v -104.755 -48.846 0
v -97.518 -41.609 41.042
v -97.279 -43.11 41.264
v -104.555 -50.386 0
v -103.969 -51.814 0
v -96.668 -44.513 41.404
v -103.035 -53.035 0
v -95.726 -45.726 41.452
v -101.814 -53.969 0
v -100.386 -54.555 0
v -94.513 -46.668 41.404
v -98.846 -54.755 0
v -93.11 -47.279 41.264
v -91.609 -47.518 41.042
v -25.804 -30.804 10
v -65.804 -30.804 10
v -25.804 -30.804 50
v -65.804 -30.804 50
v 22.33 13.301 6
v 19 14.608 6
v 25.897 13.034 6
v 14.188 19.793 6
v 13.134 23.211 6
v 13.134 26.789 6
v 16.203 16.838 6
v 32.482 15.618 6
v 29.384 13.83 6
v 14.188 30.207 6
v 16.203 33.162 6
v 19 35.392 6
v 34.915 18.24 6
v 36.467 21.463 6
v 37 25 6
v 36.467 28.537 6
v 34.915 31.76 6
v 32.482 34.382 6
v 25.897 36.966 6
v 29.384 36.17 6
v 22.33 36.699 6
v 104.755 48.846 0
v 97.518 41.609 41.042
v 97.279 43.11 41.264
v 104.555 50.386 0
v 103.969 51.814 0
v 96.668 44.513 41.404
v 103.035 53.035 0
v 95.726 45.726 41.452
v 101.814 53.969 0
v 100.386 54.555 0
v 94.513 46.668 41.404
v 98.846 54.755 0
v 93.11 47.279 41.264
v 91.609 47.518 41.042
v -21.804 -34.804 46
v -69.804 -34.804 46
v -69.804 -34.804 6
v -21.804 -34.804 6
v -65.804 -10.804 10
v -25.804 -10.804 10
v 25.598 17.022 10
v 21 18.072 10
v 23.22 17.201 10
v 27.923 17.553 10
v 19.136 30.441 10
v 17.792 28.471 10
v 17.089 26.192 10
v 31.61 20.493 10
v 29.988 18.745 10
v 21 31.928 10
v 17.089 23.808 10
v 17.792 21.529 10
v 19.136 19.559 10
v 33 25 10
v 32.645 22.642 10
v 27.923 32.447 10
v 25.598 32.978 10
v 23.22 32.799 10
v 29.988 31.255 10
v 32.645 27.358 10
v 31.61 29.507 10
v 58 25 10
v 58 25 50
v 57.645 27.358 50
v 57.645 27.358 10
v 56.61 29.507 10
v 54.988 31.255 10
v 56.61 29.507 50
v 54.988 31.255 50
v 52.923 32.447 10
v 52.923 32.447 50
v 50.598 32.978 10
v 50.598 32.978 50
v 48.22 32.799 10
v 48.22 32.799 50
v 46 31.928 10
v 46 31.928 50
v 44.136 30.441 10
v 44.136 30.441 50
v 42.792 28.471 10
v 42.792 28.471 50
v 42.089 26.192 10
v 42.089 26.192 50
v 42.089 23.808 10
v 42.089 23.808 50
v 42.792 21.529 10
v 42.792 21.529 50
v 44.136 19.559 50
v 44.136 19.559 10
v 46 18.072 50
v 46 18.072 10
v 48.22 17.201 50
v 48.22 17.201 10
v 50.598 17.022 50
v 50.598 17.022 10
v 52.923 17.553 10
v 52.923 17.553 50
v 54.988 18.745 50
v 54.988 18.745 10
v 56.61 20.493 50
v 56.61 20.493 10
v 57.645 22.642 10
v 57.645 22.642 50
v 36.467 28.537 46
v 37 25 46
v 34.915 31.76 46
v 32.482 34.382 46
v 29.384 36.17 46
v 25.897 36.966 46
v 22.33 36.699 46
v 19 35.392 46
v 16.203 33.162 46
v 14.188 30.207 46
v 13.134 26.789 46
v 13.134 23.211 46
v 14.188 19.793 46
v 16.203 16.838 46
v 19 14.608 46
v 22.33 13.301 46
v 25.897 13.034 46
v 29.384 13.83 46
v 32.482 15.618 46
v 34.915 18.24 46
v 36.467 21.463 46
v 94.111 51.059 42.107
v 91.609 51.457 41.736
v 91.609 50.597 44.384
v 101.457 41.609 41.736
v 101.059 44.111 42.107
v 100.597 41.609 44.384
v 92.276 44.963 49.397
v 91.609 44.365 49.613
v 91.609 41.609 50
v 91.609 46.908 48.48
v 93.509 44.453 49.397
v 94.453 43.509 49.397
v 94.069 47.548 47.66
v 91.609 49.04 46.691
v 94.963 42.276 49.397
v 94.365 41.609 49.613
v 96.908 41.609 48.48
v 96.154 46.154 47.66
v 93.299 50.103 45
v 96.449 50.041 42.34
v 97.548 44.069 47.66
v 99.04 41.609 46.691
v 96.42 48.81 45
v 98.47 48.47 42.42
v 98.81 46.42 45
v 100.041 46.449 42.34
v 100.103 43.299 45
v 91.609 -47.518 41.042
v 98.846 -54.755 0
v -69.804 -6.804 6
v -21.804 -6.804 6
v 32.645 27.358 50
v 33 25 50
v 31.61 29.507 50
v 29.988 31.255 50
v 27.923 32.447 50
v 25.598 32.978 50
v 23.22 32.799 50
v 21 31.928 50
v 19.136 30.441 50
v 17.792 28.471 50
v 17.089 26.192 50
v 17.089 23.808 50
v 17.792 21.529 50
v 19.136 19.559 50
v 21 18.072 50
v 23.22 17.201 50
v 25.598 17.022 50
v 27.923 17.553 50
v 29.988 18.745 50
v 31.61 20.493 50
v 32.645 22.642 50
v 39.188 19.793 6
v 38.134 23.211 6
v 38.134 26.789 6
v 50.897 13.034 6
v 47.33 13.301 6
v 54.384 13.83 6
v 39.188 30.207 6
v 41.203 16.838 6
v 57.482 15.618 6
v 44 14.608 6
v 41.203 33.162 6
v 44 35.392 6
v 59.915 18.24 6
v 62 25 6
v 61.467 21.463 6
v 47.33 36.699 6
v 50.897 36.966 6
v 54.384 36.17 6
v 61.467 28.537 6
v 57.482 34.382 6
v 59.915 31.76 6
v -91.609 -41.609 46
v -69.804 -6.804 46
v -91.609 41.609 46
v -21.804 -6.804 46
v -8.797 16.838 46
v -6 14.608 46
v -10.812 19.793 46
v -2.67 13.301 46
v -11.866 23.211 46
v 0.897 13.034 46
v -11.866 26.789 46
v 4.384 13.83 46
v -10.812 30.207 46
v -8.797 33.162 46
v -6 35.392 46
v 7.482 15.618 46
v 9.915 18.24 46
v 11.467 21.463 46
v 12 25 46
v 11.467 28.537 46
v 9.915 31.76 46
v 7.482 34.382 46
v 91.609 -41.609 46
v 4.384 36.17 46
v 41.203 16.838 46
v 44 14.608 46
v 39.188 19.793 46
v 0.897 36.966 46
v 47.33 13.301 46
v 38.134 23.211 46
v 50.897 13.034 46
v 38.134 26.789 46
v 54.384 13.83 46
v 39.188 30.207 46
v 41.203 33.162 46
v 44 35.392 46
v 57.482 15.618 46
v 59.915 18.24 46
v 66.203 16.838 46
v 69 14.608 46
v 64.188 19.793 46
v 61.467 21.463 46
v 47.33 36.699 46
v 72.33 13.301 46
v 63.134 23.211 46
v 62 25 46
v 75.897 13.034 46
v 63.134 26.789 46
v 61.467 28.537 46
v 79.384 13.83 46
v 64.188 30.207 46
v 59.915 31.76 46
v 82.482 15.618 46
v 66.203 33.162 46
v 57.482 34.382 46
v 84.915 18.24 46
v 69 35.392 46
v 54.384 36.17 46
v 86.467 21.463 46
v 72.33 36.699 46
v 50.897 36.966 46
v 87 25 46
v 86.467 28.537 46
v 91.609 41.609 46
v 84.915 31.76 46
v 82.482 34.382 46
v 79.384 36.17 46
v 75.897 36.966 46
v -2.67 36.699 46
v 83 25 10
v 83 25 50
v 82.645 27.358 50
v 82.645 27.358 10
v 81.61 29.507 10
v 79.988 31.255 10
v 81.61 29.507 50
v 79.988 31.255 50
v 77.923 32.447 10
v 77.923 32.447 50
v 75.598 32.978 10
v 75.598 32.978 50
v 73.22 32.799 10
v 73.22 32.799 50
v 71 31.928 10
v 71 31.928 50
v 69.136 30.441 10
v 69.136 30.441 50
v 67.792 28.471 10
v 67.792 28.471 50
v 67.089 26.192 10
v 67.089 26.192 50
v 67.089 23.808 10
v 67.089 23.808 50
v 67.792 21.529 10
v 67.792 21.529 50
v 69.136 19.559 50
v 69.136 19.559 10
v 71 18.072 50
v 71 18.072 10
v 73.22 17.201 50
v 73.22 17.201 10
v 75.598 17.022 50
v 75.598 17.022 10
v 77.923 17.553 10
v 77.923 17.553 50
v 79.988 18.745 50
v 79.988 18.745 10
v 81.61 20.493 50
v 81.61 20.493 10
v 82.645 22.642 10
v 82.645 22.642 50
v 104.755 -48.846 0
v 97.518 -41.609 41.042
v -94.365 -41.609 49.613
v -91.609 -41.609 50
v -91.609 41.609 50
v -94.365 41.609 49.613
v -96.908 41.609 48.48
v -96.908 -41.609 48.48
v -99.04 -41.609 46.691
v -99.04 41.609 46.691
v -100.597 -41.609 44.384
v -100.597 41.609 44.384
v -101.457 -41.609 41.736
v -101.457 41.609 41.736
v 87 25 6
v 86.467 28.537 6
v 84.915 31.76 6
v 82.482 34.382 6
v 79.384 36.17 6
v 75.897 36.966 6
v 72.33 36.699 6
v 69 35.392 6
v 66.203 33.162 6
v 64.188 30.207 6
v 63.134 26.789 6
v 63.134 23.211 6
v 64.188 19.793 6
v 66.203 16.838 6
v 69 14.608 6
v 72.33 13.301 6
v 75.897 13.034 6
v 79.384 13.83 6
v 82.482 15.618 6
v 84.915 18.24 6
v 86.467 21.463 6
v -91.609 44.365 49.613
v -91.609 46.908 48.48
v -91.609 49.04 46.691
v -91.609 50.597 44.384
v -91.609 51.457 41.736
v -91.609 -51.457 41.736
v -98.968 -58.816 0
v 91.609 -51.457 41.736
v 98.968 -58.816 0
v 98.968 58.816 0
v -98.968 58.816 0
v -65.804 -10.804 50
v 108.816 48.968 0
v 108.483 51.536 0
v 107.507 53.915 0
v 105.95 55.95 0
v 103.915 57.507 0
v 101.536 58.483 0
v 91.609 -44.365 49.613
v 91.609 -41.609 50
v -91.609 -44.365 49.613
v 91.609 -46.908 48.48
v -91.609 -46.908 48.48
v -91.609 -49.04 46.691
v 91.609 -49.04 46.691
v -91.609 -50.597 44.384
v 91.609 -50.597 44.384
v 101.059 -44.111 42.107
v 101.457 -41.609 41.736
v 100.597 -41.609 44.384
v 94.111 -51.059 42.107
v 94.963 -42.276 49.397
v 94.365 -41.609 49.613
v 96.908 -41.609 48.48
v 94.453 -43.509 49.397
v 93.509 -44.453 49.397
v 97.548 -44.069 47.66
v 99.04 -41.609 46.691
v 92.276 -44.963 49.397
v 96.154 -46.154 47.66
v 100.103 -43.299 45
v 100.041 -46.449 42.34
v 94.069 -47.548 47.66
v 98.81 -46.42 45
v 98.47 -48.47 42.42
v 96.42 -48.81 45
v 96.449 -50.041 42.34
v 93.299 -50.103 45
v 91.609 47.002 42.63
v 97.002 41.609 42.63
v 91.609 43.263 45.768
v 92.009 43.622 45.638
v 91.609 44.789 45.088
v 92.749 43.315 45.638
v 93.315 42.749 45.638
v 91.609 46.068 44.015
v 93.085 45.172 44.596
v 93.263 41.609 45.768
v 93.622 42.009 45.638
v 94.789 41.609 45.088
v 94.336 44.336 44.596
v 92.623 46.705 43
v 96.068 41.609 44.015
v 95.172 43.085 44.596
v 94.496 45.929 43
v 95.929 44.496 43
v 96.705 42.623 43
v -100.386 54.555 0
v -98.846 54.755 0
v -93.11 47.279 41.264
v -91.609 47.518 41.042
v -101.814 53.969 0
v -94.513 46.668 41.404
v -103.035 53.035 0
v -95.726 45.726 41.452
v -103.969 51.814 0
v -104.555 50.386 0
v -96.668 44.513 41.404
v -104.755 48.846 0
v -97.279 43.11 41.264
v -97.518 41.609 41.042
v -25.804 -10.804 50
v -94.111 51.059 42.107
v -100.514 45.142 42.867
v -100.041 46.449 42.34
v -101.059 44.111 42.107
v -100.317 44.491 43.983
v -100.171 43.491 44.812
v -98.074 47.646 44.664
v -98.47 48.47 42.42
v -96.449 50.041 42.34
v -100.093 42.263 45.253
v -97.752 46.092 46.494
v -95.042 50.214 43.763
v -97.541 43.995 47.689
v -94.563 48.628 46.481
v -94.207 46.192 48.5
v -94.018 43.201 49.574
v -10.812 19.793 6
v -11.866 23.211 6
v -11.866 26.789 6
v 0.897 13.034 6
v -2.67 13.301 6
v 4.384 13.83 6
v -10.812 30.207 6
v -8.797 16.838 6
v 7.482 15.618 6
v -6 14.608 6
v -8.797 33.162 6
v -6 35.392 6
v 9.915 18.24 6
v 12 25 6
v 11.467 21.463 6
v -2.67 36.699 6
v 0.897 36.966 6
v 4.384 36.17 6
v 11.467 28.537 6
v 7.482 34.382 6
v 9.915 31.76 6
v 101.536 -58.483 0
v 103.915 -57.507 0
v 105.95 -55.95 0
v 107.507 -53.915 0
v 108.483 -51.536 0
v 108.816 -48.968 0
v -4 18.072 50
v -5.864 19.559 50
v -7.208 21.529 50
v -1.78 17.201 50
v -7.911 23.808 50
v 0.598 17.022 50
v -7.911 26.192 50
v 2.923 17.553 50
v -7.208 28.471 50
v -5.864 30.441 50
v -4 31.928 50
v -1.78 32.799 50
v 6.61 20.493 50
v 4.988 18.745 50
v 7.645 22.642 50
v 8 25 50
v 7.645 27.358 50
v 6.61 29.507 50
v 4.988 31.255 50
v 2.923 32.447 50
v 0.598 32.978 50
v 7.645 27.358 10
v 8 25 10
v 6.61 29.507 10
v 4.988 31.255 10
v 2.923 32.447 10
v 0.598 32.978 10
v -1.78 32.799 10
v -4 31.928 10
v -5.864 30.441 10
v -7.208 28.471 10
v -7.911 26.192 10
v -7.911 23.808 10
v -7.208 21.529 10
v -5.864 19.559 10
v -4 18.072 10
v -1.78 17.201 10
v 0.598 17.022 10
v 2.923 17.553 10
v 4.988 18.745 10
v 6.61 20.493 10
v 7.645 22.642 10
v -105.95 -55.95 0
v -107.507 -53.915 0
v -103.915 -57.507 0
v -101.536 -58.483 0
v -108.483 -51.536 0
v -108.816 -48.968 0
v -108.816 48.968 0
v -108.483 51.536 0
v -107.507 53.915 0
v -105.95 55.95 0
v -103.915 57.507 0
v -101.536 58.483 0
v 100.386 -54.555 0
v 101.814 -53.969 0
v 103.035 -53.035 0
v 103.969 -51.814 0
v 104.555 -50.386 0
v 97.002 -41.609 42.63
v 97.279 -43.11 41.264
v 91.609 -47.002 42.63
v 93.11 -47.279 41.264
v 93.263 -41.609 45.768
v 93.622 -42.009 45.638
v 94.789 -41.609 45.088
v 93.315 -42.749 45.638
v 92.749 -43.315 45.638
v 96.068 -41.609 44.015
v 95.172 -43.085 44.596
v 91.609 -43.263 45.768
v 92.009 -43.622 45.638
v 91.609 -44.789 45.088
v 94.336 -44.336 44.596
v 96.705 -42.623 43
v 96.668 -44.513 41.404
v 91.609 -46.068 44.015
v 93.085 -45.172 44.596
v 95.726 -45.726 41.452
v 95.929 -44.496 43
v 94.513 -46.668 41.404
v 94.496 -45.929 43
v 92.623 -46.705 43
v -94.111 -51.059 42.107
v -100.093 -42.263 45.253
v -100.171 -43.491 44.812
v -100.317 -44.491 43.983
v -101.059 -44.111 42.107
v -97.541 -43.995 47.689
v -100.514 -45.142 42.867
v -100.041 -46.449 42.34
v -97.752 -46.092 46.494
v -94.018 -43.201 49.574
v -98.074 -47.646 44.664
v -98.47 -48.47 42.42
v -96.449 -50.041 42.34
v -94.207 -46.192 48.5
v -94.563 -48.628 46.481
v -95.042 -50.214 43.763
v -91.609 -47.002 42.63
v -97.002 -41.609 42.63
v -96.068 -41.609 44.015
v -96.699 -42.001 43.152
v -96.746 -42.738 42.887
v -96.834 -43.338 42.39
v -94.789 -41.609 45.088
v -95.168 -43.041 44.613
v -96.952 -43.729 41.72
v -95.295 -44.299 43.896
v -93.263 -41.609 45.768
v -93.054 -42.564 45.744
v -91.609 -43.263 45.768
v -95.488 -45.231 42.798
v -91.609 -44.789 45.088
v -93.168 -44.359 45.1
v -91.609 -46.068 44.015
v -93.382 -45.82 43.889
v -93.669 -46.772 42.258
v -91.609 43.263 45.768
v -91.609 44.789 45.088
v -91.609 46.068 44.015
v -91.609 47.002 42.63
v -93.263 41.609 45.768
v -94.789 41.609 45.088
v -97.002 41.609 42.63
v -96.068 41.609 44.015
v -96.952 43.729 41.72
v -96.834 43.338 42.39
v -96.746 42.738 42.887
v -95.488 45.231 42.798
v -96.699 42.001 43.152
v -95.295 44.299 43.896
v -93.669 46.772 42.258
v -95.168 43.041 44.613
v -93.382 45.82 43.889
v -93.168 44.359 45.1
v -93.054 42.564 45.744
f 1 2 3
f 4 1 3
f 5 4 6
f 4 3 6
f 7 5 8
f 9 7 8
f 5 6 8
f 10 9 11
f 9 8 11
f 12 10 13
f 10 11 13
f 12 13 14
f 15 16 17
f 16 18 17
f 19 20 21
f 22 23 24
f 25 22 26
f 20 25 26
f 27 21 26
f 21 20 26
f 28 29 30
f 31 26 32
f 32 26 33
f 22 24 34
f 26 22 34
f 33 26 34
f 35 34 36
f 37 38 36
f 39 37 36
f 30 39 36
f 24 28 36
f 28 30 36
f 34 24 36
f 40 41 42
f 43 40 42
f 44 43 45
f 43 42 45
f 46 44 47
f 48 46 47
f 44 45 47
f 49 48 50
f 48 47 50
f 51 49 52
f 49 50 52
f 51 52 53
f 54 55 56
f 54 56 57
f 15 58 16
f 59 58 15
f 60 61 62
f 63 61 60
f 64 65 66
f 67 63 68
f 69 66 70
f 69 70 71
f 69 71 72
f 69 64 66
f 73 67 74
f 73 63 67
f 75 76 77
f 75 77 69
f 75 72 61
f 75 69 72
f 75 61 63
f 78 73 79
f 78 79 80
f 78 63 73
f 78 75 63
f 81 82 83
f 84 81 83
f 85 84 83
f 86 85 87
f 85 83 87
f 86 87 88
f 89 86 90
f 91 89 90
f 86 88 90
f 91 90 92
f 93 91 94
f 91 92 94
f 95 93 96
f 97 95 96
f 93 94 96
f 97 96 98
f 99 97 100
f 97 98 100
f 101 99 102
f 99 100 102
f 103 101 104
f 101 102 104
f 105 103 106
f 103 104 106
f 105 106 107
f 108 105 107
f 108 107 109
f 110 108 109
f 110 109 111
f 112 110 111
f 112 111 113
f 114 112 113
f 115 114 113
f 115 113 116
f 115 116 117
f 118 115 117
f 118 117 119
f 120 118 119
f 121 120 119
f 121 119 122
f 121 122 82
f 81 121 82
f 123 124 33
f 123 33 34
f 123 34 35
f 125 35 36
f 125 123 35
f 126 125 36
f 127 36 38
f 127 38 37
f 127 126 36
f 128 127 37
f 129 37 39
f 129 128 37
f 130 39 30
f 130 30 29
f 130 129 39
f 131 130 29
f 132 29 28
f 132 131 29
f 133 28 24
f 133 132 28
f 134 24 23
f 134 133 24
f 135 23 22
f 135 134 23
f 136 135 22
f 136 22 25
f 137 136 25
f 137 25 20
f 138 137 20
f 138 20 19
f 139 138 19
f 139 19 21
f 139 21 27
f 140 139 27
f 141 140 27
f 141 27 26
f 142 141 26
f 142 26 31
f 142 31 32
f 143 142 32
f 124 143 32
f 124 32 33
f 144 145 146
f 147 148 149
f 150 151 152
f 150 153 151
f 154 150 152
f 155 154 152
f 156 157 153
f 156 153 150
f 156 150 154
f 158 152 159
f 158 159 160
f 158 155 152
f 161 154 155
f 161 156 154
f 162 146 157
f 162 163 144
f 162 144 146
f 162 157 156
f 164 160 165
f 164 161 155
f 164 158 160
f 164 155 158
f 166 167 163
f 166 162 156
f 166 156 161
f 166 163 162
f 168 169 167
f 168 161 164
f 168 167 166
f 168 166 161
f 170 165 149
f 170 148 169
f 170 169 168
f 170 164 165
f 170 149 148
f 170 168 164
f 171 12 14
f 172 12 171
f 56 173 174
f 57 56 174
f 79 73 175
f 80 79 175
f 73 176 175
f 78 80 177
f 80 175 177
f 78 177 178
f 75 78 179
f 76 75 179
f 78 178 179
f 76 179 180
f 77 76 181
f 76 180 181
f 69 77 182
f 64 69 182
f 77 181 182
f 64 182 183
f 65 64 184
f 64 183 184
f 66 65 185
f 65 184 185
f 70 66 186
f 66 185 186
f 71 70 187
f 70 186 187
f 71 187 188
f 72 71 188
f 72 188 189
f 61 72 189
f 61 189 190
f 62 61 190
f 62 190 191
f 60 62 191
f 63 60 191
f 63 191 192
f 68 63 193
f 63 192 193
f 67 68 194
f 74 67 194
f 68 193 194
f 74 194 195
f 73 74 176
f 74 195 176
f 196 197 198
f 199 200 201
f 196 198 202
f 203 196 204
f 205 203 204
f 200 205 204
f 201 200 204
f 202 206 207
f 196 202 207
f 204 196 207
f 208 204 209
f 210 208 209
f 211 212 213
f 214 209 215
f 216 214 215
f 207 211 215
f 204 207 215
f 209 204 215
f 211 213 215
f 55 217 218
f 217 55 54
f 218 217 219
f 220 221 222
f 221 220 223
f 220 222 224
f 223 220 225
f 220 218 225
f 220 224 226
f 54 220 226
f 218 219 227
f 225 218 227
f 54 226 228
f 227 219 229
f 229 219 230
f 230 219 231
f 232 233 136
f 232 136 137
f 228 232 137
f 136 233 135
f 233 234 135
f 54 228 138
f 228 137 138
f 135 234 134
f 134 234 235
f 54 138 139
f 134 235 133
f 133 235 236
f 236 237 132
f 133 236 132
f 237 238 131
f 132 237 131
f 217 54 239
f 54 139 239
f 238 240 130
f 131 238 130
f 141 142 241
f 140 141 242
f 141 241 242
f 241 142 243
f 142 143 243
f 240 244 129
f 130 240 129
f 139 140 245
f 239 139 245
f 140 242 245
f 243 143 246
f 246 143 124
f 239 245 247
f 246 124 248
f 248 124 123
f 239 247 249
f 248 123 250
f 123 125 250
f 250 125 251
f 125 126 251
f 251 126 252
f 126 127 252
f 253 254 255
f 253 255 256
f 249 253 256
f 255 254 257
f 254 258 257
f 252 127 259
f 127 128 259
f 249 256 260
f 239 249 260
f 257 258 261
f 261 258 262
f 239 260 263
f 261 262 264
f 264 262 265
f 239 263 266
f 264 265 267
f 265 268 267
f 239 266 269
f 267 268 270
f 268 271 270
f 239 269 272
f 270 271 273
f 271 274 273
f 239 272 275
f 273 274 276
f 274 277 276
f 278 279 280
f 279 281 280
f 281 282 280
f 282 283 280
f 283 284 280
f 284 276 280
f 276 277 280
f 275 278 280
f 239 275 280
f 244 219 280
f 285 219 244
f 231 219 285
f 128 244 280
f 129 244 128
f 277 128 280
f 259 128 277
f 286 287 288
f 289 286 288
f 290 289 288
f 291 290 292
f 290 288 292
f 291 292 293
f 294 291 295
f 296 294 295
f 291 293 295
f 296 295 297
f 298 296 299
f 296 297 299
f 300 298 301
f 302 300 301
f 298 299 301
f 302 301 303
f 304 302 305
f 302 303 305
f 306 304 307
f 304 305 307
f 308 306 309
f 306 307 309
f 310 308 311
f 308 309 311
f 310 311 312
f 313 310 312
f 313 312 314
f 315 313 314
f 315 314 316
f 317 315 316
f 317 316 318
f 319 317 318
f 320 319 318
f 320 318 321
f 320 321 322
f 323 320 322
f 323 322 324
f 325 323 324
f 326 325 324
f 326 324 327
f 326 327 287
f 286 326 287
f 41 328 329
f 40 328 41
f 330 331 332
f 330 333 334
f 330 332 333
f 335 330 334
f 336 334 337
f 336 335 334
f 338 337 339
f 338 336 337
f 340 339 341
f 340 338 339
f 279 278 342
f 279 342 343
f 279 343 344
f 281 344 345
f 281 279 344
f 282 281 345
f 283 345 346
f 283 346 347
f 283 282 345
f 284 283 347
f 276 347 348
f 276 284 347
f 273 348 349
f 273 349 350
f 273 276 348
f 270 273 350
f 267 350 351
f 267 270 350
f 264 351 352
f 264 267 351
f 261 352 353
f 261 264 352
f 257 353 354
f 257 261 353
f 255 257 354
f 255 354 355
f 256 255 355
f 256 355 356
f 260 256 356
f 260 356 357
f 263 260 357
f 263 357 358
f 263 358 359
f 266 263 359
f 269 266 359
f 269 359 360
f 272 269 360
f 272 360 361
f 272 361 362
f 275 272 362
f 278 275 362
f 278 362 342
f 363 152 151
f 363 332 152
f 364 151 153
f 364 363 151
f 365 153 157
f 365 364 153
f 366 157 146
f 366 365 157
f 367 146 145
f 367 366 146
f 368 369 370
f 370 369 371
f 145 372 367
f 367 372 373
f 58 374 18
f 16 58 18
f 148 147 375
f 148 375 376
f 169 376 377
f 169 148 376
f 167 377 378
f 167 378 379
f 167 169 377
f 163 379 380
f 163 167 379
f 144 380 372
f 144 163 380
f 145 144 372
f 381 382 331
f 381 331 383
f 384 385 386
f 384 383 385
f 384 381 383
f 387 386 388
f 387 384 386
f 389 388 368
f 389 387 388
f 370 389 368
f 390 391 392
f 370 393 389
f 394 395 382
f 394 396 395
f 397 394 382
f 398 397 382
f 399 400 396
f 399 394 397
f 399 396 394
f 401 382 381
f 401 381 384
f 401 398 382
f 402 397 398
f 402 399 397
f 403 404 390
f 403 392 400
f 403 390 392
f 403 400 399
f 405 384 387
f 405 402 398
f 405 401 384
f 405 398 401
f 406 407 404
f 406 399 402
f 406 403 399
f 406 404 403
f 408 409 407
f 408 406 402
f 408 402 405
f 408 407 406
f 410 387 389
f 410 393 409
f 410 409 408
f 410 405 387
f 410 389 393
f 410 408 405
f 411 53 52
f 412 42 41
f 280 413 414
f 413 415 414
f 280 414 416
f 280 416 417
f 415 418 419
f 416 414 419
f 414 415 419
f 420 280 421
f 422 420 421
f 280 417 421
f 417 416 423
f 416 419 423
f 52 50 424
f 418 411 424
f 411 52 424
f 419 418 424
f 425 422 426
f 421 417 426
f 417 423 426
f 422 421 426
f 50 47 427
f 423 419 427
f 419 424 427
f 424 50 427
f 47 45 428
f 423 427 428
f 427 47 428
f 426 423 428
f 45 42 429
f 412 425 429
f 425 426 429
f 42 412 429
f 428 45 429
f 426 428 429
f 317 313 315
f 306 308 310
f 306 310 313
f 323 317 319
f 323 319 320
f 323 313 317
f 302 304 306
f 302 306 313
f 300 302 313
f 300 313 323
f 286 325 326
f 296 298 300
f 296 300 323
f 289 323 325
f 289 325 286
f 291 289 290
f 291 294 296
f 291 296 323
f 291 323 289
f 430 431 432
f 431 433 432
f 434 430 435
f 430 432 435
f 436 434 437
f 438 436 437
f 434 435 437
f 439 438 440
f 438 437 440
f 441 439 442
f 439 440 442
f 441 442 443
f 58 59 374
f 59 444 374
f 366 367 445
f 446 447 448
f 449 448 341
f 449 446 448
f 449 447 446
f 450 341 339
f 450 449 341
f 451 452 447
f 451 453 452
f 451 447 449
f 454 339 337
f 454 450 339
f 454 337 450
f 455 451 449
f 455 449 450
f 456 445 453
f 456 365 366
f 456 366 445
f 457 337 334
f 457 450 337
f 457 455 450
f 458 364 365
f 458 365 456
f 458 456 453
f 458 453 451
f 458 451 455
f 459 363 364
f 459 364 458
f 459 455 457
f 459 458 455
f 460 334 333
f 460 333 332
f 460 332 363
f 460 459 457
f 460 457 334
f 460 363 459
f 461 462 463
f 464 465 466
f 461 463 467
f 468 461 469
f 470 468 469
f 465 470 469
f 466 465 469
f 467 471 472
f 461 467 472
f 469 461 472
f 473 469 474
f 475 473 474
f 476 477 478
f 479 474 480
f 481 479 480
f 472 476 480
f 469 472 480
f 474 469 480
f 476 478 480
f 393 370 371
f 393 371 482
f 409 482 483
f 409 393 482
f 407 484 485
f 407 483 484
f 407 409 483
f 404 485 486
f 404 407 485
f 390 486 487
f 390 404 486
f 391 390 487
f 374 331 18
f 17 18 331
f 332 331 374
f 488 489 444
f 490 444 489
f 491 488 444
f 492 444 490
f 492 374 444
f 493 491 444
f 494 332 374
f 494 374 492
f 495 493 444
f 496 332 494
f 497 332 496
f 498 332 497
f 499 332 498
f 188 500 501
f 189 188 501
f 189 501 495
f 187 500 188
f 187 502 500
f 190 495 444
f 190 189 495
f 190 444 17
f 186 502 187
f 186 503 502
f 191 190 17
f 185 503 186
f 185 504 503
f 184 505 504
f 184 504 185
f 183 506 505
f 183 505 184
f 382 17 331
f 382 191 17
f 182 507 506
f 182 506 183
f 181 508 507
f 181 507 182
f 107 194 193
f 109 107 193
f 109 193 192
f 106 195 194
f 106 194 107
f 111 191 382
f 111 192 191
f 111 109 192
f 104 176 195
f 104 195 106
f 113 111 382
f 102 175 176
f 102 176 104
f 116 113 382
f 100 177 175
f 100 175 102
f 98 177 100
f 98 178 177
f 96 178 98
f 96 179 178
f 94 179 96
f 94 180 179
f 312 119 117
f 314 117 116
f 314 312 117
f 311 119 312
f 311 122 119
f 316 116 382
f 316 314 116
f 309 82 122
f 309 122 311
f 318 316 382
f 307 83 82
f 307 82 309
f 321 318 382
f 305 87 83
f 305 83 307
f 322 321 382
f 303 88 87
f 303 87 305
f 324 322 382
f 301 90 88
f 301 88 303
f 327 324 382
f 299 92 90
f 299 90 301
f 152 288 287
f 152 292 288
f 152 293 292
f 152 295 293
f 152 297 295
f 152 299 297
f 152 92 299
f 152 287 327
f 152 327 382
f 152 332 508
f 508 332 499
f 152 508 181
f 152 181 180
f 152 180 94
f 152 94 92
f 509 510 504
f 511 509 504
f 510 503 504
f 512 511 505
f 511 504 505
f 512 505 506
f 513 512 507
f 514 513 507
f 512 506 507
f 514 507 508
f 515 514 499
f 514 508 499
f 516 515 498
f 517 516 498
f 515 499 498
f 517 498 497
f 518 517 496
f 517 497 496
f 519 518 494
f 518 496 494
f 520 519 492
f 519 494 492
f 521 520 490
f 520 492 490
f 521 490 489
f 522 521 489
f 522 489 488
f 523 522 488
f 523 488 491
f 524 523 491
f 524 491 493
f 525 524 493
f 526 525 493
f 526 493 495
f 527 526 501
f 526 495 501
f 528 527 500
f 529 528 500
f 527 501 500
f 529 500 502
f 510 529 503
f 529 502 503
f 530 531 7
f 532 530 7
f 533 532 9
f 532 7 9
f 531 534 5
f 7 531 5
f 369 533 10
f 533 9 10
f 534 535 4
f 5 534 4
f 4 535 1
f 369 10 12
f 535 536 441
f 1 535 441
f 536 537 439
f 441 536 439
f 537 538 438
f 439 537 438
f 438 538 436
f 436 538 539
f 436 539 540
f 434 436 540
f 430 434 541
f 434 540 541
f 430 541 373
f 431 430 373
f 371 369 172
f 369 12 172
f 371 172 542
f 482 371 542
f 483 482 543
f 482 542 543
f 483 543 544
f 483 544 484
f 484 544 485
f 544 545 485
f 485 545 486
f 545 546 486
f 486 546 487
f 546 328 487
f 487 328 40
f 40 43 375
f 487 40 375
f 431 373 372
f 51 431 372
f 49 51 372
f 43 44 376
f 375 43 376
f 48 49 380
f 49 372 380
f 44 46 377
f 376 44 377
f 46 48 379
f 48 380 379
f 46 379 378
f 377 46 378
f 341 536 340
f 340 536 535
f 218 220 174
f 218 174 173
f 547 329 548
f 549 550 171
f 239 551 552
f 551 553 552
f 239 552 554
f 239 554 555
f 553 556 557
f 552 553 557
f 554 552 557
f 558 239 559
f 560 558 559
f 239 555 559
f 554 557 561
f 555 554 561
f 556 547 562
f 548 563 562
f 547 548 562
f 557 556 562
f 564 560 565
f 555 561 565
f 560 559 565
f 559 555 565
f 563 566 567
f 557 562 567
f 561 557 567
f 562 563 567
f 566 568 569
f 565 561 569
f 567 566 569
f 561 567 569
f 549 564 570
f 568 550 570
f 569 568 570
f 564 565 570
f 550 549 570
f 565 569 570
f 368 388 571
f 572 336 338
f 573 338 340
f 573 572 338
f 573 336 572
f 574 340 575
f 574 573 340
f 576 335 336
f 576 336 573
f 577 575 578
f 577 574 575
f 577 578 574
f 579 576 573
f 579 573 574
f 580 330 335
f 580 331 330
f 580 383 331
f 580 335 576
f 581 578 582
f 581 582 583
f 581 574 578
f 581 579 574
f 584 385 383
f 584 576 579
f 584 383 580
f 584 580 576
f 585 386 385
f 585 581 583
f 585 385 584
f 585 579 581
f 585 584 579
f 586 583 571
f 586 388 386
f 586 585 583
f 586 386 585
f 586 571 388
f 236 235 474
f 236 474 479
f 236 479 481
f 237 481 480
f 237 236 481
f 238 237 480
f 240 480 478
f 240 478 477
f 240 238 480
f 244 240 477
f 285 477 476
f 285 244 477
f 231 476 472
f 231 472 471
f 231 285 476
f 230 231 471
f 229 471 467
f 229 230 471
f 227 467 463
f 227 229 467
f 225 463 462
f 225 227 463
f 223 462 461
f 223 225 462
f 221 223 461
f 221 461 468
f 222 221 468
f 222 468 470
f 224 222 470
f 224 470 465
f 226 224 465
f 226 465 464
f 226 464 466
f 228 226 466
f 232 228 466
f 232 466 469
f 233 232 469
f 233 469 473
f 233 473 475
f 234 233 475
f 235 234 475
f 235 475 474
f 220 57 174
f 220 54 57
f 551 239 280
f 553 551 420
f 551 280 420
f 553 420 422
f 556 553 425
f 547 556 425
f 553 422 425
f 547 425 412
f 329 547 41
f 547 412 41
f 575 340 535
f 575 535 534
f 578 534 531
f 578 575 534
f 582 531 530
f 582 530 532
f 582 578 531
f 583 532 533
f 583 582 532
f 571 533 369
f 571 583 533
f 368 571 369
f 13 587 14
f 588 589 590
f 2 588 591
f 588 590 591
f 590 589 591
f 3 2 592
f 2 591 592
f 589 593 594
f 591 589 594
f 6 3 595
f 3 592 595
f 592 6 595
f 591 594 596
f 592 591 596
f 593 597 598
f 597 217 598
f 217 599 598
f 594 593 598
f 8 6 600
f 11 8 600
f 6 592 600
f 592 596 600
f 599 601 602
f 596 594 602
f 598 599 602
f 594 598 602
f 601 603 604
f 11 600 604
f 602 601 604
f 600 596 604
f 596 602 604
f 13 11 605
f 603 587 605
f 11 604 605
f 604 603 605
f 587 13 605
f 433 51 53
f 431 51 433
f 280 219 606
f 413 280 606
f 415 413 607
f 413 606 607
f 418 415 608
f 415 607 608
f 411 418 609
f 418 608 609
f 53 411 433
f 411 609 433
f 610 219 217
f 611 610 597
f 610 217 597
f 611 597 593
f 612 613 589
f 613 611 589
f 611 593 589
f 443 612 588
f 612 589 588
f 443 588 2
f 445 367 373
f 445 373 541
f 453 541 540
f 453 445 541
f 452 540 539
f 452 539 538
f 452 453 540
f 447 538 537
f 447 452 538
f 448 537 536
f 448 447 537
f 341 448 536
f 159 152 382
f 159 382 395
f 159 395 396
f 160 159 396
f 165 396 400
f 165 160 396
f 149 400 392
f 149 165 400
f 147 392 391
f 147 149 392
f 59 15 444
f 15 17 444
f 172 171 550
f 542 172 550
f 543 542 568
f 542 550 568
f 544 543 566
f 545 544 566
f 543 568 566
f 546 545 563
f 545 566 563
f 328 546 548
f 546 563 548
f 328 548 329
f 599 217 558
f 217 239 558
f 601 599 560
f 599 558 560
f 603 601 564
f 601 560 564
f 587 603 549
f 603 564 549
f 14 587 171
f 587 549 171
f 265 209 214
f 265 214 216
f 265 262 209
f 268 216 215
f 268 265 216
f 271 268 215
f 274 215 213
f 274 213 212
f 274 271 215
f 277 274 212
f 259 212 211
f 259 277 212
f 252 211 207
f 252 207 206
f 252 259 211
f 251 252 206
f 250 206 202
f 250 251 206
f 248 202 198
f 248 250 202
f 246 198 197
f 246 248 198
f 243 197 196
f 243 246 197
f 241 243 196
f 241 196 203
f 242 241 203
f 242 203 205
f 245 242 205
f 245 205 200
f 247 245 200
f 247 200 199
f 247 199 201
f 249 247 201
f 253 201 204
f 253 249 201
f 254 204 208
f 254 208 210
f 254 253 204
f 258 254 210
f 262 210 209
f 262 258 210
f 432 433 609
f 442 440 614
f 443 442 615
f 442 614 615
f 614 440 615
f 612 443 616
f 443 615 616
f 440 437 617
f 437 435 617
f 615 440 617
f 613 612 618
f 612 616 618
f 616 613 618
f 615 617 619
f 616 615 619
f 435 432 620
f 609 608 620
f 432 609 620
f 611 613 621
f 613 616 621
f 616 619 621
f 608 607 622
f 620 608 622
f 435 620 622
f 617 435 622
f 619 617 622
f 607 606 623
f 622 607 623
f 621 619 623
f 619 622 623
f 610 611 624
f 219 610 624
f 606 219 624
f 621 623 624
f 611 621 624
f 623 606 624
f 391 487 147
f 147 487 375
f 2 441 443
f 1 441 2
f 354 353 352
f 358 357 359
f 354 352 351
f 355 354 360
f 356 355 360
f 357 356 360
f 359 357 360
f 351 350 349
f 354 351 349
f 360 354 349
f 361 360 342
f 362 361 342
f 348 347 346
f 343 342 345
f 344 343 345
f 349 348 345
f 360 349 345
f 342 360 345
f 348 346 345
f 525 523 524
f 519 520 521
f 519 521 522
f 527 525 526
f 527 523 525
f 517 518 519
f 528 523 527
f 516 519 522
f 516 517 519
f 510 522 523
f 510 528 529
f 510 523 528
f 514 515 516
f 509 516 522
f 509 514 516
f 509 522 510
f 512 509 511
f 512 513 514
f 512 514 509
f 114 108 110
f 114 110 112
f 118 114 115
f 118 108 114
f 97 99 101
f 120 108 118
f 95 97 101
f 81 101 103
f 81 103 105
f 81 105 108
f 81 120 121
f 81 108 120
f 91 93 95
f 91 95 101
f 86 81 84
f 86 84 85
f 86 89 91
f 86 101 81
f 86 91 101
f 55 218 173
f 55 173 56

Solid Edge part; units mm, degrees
sketch "Sketch1" plane through (0, 0, 0) normal (0, 0, 1) x (1, 0, 0)
  line L0 (100, -50) -> (100, 50)
  line L1 (100, 50) -> (-100, 50)
  line L2 (-100, 50) -> (-100, -50)
  line L3 (-100, -50) -> (100, -50)
extrude "Protrusion1" add sketch "Sketch1" along normal blind 50
draft "Draft_1" angle 10 neutral plane through (0, 0, 50) normal (0, 0, 1) pull direction (0, 0, 1) face at (-68.6667, -50, 41.1667) face at (100, -34.3333, 41.1667) face at (68.6667, 50, 41.1667) face at (-100, 34.3333, 41.1667)
fillet "Round_1" radius 10 8 edges at (104.4082, -54.4082, 25) (104.4082, 54.4082, 25) (0, -50, 50) (100, 0, 50) (0, 50, 50) (-104.4082, -54.4082, 25) (-100, 0, 50) (-104.4082, 54.4082, 25)
sketch "Sketch2" plane through (0, 0, 50) normal (0, 0, 1) x (1, 0, 0)
  line L0 (-25.8045, -10.8045) -> (-65.8045, -10.8045)
  line L1 (-65.8045, -10.8045) -> (-65.8045, -30.8045)
  line L2 (-65.8045, -30.8045) -> (-25.8045, -30.8045)
  line L3 (-25.8045, -30.8045) -> (-25.8045, -10.8045)
  circle A0 centre (0, 25) radius 8
  circle A1 centre (25, 25) radius 8
  circle A2 centre (50, 25) radius 8
  circle A3 centre (75, 25) radius 8
extrude "Cutout_1" cut sketch "Sketch2" against normal blind 40
shell "Thin_Wall_1" thickness 4 removed faces 1 at (-74.7206, -38.0346, 0)
